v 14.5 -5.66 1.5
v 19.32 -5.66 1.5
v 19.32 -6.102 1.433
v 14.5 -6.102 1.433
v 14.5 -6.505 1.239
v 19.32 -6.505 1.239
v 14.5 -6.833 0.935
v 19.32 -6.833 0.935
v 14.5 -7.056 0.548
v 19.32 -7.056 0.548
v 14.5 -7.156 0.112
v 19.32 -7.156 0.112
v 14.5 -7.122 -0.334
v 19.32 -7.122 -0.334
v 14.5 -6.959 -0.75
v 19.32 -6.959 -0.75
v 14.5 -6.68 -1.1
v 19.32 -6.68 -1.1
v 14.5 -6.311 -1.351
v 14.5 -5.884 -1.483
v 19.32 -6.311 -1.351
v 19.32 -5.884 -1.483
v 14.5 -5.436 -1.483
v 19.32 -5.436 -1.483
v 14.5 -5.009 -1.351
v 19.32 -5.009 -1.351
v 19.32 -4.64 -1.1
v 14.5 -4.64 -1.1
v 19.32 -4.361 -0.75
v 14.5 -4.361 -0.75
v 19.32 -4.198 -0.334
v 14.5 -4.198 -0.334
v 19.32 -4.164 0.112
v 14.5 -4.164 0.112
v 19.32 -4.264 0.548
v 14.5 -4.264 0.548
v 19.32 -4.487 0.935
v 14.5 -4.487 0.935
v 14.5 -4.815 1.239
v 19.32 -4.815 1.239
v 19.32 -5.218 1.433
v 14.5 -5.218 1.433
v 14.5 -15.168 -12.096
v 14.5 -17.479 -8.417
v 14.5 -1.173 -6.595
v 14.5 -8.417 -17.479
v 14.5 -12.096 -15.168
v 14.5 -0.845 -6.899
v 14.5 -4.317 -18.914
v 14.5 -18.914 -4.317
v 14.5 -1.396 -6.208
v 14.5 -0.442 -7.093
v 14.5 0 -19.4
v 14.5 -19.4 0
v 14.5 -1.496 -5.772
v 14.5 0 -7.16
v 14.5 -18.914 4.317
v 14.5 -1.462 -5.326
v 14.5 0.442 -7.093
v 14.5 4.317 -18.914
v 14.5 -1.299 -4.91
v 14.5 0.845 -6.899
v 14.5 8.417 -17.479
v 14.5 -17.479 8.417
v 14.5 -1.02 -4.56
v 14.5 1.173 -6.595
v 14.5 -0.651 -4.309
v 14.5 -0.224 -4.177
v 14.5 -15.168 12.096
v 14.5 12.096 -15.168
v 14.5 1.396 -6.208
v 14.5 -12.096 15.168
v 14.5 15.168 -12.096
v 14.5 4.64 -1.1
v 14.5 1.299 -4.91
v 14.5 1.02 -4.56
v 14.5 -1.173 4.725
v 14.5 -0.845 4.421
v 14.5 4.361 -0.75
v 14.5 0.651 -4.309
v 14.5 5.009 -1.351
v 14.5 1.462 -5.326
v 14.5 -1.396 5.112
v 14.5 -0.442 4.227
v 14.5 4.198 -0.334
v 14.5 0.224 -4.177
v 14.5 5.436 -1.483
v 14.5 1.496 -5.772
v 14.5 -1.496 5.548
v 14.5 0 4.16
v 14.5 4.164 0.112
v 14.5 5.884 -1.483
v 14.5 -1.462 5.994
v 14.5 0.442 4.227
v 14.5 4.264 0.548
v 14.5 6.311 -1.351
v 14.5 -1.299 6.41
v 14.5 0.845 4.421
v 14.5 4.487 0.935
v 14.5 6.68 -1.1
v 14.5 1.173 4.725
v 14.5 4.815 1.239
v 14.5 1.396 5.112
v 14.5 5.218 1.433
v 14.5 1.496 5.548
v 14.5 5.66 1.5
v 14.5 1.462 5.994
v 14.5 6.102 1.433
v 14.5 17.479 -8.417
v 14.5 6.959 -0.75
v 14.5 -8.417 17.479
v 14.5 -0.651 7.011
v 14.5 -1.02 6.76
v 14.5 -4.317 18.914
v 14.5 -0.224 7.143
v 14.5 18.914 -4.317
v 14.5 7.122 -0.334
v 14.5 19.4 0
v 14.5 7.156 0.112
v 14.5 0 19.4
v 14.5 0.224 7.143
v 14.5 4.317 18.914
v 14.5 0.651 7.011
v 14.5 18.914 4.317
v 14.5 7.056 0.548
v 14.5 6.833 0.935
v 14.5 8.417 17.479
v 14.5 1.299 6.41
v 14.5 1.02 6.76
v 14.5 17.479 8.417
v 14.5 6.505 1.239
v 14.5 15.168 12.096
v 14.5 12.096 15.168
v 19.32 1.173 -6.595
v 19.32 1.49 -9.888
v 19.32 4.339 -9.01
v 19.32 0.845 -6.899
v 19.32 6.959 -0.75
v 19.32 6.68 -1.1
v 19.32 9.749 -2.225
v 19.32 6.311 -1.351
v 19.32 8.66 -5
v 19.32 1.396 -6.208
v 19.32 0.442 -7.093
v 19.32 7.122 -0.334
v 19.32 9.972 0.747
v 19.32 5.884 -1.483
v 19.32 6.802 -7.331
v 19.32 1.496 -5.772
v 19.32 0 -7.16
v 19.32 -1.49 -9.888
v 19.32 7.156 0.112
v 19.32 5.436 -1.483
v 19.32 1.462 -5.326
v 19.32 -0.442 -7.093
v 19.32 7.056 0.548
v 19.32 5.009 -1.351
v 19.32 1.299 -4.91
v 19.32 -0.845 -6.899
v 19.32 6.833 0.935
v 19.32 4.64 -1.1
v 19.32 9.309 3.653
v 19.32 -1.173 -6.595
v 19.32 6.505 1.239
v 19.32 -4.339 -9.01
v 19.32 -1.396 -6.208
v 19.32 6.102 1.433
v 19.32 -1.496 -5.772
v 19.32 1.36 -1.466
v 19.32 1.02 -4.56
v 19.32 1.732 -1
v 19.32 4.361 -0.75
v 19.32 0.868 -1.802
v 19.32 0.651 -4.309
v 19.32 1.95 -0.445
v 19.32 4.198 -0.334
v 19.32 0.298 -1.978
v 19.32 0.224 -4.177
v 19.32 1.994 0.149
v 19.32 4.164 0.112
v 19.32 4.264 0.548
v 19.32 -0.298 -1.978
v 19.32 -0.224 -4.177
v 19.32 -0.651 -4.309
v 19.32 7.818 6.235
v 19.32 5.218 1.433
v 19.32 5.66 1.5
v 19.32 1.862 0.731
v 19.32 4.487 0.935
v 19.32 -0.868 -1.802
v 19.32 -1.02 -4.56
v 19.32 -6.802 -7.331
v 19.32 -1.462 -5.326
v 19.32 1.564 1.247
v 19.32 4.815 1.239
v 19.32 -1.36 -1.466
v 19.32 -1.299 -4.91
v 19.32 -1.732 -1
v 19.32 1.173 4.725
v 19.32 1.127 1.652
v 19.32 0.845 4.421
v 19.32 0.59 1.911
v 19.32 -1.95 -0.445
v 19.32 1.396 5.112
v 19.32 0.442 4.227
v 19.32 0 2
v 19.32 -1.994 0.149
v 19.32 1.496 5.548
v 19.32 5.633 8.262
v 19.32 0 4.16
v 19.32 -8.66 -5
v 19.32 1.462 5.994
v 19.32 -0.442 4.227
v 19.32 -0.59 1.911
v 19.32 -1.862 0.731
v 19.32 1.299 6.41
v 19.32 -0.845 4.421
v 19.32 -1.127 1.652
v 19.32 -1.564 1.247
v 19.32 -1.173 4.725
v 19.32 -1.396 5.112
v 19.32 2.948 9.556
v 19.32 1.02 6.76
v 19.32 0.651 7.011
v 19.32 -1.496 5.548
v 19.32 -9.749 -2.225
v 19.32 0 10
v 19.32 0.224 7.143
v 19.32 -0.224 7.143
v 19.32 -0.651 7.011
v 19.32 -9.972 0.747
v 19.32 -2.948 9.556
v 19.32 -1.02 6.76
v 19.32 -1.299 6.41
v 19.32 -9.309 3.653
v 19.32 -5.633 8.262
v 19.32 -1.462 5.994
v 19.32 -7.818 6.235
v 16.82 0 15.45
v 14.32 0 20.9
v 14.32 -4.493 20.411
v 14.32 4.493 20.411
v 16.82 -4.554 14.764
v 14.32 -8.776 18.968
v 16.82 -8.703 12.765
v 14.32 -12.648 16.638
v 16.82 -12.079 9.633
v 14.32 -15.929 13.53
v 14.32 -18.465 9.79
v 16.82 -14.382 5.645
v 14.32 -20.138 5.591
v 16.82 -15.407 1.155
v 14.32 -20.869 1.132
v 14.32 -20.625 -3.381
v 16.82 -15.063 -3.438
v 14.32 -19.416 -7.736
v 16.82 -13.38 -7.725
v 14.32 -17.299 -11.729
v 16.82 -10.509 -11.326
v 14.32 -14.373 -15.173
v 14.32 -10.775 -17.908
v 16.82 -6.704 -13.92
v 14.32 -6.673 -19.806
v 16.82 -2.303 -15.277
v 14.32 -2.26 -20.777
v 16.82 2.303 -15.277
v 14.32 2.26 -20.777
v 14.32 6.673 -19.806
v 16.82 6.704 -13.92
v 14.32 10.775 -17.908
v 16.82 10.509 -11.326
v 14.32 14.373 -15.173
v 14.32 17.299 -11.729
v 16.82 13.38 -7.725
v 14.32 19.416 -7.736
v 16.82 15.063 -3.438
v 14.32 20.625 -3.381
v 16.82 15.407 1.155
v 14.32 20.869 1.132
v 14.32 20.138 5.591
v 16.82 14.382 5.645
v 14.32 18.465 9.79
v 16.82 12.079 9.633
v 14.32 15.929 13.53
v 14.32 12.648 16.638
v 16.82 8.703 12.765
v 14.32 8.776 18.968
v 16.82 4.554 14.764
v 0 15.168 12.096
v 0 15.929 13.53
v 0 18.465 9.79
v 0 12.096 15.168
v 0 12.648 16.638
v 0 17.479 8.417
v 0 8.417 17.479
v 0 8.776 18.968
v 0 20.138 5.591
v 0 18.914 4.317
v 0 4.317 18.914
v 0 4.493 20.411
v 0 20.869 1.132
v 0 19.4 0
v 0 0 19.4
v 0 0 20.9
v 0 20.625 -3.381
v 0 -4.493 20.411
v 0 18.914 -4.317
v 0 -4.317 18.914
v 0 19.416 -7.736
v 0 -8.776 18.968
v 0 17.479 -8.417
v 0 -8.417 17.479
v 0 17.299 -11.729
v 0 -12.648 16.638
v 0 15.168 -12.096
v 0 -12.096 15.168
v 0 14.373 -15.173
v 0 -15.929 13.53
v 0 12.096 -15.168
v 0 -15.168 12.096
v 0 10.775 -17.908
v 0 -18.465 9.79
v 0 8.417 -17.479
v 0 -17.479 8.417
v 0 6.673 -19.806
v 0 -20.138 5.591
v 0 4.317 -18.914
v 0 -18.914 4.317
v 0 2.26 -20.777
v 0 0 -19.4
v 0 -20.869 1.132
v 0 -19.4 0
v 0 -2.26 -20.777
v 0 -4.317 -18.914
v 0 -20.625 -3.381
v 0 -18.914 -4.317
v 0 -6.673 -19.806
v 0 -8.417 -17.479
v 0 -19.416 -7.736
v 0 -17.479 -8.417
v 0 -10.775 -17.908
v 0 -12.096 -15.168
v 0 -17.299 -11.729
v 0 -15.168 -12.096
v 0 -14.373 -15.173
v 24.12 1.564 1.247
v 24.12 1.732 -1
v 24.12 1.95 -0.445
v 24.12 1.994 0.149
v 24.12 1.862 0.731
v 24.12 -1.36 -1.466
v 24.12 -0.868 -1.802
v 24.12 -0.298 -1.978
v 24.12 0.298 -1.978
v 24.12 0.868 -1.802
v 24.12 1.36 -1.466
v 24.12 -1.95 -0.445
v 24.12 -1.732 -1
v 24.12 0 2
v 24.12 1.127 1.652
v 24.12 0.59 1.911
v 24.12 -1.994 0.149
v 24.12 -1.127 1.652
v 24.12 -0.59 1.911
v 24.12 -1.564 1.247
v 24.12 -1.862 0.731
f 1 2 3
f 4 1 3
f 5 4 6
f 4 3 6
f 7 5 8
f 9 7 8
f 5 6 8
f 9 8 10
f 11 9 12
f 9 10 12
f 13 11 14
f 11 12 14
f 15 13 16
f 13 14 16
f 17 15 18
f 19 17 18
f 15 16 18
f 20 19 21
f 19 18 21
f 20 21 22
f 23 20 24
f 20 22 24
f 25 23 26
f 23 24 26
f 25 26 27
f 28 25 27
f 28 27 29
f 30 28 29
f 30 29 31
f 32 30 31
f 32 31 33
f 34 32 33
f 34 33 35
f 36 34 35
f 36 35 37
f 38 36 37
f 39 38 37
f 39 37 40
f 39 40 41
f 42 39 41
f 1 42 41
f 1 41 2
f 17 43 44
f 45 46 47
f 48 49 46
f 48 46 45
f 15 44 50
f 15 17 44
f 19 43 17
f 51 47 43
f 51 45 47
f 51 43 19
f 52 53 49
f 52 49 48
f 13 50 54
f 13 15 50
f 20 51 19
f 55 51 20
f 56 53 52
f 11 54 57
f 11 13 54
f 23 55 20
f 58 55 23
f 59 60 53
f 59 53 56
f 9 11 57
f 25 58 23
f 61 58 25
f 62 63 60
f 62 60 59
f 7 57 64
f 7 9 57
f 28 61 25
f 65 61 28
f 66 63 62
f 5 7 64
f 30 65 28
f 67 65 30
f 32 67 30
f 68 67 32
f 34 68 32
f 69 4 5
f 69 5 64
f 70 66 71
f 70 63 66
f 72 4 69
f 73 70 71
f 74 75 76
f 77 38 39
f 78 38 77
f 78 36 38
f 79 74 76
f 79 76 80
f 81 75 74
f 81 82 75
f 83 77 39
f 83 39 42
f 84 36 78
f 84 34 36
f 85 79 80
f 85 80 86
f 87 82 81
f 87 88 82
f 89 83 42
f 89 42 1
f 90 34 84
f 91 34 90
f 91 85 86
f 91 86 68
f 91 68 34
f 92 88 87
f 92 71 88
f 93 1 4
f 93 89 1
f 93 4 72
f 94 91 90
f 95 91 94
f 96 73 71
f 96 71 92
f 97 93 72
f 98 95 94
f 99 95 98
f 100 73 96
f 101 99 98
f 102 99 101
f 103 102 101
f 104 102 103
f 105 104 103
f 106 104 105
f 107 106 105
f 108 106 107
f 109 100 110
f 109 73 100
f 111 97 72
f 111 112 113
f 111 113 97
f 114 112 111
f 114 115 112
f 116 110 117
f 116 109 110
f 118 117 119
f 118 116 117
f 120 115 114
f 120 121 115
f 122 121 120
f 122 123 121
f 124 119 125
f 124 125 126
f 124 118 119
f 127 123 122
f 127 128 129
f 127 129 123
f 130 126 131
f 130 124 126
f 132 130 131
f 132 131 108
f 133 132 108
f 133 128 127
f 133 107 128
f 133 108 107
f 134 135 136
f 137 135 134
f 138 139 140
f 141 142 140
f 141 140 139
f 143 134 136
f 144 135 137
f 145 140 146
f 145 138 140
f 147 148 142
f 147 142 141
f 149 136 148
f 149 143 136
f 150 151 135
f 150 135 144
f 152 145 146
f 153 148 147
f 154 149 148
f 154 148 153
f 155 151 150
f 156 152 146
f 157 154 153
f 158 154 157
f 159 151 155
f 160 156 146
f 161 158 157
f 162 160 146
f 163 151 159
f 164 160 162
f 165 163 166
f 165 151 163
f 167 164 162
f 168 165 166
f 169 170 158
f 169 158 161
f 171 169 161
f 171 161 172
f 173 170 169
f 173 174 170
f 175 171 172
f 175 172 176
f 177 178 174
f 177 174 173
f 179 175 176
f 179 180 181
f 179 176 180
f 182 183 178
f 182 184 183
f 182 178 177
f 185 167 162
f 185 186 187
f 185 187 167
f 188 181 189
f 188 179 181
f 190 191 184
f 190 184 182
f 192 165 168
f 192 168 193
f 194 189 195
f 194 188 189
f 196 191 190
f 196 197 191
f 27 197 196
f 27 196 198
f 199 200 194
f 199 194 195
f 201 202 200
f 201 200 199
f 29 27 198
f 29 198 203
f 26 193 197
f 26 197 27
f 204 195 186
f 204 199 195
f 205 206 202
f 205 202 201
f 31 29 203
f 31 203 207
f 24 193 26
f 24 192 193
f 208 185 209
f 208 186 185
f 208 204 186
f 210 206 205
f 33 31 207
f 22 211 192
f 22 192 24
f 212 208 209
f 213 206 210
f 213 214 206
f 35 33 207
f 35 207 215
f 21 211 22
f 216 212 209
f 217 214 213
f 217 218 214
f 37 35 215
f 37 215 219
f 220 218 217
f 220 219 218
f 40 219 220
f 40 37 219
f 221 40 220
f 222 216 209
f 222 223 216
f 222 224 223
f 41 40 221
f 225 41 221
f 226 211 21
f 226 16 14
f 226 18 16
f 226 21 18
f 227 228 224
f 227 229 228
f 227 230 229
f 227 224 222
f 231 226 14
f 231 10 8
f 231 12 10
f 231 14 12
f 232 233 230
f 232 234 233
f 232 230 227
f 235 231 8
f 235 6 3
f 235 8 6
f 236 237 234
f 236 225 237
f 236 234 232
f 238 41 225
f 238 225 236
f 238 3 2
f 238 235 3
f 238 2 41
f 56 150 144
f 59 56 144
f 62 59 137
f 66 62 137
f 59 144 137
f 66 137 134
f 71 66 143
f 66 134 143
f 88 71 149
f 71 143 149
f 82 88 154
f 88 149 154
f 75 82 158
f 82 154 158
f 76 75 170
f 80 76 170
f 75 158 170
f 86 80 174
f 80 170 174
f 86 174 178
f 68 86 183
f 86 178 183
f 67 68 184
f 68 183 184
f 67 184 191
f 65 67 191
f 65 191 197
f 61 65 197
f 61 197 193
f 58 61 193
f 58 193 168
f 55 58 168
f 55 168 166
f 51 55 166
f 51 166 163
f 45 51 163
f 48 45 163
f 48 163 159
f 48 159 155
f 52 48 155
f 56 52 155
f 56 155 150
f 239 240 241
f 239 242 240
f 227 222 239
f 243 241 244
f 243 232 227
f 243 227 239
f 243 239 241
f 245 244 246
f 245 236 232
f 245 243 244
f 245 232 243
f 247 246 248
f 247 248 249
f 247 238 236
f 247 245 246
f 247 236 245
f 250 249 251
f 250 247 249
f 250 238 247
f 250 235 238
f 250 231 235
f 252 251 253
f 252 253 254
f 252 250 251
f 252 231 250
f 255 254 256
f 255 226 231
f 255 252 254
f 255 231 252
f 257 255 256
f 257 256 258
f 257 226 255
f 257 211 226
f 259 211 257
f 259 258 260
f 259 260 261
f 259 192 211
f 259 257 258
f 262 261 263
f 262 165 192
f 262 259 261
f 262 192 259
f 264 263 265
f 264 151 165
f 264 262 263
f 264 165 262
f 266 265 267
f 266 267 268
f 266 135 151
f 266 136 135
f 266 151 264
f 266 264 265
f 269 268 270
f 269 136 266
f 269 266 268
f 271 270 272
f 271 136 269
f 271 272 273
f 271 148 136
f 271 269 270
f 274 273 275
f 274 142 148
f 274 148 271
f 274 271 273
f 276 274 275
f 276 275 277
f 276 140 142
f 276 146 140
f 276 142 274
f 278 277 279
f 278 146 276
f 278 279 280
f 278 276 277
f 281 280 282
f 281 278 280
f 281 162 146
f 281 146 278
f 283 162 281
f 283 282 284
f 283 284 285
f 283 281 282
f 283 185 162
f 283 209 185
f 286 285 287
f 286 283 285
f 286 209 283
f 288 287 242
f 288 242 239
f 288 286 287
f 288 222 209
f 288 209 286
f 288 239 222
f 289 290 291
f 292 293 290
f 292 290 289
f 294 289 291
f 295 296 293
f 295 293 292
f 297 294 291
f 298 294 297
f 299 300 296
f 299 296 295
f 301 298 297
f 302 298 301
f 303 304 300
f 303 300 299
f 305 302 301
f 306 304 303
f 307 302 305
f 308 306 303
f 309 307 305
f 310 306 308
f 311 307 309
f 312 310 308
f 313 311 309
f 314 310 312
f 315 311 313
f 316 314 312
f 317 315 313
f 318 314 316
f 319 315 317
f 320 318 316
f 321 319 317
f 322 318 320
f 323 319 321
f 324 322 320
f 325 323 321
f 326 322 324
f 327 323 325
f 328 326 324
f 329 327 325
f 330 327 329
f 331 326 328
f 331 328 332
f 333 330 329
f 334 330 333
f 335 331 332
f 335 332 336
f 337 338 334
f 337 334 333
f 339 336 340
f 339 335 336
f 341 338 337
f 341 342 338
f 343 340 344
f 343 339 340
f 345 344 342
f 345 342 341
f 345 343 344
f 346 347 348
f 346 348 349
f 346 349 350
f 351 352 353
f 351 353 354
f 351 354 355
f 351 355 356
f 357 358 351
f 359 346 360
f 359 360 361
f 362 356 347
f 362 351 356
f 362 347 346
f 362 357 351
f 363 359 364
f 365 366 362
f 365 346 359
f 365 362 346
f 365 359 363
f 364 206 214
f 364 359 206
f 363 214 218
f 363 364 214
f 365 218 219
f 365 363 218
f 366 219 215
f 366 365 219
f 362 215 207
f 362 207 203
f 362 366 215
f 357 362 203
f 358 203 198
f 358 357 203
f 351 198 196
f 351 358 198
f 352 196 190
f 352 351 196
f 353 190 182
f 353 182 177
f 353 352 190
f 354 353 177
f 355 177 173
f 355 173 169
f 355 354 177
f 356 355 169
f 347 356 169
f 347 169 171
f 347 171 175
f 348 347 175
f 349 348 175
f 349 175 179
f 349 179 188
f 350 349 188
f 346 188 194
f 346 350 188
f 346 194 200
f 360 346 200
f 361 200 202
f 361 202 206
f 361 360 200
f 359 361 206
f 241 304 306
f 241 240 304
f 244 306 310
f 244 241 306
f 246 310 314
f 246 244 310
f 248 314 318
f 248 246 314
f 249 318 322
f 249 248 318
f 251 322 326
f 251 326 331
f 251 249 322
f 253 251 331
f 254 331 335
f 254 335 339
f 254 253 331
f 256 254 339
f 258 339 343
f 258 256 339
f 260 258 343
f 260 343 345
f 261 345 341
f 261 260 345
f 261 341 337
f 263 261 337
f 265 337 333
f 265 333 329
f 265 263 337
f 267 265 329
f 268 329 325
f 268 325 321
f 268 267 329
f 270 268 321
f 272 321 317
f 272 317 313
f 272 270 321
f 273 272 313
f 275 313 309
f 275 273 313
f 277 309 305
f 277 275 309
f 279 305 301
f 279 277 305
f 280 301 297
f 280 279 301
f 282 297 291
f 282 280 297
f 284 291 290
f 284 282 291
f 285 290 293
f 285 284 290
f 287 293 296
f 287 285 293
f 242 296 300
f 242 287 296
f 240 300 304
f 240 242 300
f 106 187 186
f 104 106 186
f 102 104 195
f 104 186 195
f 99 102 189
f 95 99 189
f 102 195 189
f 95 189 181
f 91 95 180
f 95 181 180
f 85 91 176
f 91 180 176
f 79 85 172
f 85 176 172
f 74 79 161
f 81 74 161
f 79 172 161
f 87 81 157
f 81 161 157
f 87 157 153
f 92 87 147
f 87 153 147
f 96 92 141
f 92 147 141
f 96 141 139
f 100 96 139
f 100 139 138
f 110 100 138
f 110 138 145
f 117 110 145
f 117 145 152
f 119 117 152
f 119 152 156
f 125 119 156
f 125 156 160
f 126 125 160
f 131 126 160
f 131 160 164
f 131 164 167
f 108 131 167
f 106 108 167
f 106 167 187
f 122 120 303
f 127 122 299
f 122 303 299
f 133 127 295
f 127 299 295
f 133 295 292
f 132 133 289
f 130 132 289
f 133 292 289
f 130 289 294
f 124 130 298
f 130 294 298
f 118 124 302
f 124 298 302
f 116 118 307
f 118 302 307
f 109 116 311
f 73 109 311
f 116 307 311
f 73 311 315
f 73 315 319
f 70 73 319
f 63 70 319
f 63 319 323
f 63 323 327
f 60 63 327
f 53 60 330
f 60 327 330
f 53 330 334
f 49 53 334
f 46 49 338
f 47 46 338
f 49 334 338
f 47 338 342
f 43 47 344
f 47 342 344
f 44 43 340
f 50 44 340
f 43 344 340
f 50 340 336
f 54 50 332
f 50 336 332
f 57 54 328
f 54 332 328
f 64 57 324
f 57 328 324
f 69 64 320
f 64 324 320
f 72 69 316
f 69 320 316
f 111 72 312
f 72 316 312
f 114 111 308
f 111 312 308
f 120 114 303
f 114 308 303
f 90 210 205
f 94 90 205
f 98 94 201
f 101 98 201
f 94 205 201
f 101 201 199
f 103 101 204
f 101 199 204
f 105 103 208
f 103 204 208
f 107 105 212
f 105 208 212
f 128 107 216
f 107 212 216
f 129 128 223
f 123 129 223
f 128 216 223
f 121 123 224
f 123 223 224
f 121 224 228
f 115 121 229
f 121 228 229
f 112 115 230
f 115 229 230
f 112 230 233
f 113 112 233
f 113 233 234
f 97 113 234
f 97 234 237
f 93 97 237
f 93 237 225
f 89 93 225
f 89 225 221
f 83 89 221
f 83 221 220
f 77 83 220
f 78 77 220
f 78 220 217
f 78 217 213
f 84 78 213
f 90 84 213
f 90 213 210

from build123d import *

# Parameters (mm, degrees)
ESQUISSE2_R             = 1.5
ENL_V_MAT_EXTRU_1_DEPTH = 7.5
ESQUISSE3_R             = 19.4
ENL_V_MAT_EXTRU_2_DEPTH = 14.5


with BuildPart() as part:
    # Esquisse1 → Révolution1 (revolve)
    with BuildSketch(Plane.XY, mode=Mode.PRIVATE) as r_volution1_sk:
        Polygon((0, 20.9), (14.32, 20.9), (19.32, 10), (19.32, 2), (24.12, 2), (24.12, 0), (0, 0), align=None)
    revolve(r_volution1_sk.sketch.rotate(Axis((0, 0, 0), (1, 0, 0)), 90), axis=Axis((0, 0, 0), (1, 0, 0)))

    # Esquisse2 → Enlèv. mat.-Extru.1 (cut)
    with BuildSketch(Plane(origin=(19.32, 0, 0), x_dir=(0, 0, -1), z_dir=(1, 0, 0))):
        with Locations(Location((0, -5.66, 0), (0, 0, 180))):
            Circle(ESQUISSE2_R)
        with Locations((-5.66, 0)):
            Circle(ESQUISSE2_R)
        with Locations(Location((0, 5.66, 0), (0, 0, 180))):
            Circle(ESQUISSE2_R)
        with Locations((5.66, 0)):
            Circle(ESQUISSE2_R)
    extrude(amount=-ENL_V_MAT_EXTRU_1_DEPTH, mode=Mode.SUBTRACT)

    # Esquisse3 → Enlèv. mat.-Extru.2 (cut)
    with BuildSketch(Plane.ZY):
        Circle(ESQUISSE3_R)
    extrude(amount=-ENL_V_MAT_EXTRU_2_DEPTH, mode=Mode.SUBTRACT)


solid = part.part
